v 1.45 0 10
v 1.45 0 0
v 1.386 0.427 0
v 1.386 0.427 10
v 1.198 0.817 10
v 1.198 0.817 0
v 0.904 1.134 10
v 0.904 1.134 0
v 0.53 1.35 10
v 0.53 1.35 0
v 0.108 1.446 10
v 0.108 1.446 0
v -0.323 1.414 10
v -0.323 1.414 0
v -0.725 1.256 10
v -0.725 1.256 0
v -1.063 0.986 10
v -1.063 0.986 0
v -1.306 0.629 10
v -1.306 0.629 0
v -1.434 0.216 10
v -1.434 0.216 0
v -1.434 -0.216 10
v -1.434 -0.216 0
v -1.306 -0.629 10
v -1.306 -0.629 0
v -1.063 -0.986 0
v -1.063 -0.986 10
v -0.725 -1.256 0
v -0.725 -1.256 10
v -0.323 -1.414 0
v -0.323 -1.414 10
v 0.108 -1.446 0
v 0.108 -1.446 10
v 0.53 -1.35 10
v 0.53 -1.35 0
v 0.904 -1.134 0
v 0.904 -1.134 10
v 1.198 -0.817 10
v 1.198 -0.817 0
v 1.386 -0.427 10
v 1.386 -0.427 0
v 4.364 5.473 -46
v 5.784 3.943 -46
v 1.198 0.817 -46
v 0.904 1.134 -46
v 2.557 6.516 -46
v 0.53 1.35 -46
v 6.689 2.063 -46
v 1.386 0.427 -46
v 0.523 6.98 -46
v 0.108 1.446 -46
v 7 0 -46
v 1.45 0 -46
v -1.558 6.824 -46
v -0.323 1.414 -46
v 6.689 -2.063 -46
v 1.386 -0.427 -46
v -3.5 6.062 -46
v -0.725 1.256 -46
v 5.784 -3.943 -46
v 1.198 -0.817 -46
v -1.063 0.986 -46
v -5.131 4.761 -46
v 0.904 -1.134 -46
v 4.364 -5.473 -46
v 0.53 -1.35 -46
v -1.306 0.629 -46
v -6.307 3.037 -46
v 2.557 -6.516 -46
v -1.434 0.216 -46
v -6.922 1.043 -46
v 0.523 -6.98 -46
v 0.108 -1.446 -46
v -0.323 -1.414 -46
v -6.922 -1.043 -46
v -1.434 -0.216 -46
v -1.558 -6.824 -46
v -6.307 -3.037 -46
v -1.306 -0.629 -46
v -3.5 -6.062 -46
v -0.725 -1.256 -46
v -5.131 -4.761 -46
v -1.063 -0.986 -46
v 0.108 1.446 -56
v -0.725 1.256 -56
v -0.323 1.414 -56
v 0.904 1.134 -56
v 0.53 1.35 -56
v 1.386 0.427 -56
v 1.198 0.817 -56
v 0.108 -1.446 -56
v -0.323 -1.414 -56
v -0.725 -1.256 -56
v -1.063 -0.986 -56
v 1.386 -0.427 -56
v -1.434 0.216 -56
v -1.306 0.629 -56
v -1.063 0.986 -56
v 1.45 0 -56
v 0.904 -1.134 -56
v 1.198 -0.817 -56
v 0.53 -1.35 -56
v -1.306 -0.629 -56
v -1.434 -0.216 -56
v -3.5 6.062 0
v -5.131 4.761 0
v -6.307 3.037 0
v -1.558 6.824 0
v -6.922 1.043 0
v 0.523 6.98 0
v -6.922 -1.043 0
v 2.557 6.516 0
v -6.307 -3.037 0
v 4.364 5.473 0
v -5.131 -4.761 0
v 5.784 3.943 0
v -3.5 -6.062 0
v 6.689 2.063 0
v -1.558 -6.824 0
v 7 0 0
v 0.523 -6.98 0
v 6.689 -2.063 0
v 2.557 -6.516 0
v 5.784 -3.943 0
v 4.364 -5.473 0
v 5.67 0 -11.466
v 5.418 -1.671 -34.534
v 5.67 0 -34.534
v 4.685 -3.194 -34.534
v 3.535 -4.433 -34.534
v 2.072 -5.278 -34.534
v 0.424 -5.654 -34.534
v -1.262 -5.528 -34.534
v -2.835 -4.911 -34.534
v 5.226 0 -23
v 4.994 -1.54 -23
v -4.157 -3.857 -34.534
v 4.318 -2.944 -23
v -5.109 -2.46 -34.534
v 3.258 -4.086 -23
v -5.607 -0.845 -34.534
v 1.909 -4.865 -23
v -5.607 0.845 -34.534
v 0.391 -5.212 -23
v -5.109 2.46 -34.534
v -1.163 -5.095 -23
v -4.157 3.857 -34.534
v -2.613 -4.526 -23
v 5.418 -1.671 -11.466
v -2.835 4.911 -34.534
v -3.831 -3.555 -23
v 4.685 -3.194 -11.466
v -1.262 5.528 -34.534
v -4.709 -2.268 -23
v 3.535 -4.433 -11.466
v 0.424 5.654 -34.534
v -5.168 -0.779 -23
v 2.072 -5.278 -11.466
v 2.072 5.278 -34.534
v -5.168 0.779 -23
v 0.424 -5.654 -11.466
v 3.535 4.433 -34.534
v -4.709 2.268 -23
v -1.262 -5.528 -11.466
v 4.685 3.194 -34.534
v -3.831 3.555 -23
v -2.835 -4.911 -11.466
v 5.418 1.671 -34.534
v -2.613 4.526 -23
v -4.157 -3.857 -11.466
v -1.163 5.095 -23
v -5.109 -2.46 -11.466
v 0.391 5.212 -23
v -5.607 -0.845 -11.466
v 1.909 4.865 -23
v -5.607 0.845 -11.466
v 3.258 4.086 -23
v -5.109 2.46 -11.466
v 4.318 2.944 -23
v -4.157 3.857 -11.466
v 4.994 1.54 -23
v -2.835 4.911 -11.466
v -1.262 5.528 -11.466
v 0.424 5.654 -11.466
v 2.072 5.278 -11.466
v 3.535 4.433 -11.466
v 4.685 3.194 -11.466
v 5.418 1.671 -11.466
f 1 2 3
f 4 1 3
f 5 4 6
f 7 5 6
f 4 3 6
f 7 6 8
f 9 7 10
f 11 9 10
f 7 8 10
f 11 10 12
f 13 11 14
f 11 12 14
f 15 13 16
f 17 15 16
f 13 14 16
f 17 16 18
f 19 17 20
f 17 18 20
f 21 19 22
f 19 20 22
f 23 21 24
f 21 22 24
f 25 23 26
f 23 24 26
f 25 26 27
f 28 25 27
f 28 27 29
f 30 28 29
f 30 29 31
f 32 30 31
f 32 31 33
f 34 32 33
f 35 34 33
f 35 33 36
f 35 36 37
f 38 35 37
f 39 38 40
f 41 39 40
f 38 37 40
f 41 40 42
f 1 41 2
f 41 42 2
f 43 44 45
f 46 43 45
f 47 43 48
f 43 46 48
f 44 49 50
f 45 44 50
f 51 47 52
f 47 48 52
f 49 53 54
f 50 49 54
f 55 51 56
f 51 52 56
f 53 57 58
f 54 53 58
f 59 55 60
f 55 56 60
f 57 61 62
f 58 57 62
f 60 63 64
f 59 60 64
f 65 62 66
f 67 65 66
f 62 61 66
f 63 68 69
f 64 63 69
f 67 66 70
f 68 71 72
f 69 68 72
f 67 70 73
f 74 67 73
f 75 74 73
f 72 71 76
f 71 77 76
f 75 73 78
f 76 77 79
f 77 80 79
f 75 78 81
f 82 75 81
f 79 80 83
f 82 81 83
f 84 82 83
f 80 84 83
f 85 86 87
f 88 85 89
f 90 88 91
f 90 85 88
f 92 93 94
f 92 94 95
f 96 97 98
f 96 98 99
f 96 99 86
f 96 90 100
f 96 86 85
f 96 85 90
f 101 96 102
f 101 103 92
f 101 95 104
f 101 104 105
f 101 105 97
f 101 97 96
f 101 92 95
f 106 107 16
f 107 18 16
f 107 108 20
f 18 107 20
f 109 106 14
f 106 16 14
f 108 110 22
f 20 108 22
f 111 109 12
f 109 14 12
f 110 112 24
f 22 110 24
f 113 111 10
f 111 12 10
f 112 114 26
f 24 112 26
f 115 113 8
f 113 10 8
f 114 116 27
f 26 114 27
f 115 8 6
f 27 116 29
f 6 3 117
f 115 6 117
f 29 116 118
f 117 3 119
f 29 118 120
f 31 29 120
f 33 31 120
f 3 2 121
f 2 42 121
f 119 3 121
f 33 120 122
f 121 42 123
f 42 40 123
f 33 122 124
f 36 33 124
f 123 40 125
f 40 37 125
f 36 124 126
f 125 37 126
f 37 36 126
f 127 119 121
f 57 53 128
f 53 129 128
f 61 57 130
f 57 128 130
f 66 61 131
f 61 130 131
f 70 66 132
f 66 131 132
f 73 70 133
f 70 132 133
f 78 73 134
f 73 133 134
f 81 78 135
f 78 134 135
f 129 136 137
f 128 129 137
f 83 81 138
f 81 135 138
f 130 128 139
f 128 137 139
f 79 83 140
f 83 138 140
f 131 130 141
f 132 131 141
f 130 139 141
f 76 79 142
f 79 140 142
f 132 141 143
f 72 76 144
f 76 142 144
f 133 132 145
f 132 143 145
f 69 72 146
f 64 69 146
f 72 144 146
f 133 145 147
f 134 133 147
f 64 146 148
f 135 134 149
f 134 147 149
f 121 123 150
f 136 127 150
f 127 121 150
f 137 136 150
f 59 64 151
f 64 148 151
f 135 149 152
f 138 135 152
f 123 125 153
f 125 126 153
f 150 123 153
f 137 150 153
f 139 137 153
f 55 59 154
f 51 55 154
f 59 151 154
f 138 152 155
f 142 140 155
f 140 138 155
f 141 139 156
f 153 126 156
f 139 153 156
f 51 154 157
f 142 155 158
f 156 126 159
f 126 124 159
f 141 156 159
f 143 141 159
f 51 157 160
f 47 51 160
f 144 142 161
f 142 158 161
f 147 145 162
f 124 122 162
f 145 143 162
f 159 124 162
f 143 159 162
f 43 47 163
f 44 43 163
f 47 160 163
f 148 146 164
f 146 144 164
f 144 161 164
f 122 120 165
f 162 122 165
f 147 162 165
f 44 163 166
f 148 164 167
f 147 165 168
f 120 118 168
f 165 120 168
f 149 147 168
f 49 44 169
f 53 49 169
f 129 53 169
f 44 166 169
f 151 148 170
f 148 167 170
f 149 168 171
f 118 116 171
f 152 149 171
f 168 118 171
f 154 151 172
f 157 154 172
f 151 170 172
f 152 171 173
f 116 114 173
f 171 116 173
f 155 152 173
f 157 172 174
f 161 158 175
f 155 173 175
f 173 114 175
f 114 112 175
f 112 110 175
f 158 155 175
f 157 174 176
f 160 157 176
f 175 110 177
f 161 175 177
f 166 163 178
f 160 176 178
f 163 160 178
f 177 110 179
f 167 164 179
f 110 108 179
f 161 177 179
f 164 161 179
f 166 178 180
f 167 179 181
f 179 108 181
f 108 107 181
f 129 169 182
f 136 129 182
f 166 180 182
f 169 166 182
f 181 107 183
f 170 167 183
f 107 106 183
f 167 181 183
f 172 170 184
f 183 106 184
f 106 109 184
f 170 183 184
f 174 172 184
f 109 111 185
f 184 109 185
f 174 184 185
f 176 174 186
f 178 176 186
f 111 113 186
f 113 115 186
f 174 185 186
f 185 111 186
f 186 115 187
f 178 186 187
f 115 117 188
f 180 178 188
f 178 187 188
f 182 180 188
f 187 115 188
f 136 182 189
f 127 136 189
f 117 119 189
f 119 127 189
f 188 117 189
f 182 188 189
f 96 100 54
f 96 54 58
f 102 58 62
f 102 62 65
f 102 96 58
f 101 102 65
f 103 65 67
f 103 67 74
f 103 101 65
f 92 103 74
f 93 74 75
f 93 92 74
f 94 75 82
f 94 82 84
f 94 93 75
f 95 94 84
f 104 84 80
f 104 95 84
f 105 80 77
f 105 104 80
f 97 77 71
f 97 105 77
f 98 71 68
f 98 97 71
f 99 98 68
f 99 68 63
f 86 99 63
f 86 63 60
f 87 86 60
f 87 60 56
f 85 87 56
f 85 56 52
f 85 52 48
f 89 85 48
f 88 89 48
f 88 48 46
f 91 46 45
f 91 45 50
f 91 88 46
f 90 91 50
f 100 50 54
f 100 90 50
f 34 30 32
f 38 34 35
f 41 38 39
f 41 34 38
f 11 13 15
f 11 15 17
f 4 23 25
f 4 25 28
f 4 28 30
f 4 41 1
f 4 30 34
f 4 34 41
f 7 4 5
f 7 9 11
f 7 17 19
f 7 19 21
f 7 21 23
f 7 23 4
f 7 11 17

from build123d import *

# Parameters (mm, degrees)
SKETCH2_R           = 1.45
BOSS_EXTRUDE1_DEPTH = 10
BOSS_EXTRUDE2_START = 10
SKETCH3_R           = 1.45
BOSS_EXTRUDE2_DEPTH = 10


with BuildPart() as part:
    # Sketch1 → Revolve1 (revolve)
    with BuildSketch(Plane(origin=(0, 0, 0), x_dir=(1, 0, 0), z_dir=(0, 1, 0))):
        with BuildLine():
            Line((0, 0), (0, 46))
            Line((0, 46), (7, 46))
            ThreePointArc((7, 46), (5.226178525, 23), (7, 0))
            Line((7, 0), (0, 0))
        make_face()
    revolve(axis=Axis((0, 0, 0), (0, 0, -1)))

    # Sketch2 → Boss-Extrude1 (add)
    with BuildSketch(Plane.XY):
        Circle(SKETCH2_R)
    extrude(amount=BOSS_EXTRUDE1_DEPTH)

    # Sketch3 → Boss-Extrude2 (add)
    with BuildSketch(Plane(origin=(0, 0, -46), x_dir=(-1, 0, 0), z_dir=(0, 0, -1)).offset(BOSS_EXTRUDE2_START)):
        with Locations(Location((0, 0, 0), (0, 0, 180))):
            Circle(SKETCH3_R)
    extrude(amount=-BOSS_EXTRUDE2_DEPTH)


solid = part.part
